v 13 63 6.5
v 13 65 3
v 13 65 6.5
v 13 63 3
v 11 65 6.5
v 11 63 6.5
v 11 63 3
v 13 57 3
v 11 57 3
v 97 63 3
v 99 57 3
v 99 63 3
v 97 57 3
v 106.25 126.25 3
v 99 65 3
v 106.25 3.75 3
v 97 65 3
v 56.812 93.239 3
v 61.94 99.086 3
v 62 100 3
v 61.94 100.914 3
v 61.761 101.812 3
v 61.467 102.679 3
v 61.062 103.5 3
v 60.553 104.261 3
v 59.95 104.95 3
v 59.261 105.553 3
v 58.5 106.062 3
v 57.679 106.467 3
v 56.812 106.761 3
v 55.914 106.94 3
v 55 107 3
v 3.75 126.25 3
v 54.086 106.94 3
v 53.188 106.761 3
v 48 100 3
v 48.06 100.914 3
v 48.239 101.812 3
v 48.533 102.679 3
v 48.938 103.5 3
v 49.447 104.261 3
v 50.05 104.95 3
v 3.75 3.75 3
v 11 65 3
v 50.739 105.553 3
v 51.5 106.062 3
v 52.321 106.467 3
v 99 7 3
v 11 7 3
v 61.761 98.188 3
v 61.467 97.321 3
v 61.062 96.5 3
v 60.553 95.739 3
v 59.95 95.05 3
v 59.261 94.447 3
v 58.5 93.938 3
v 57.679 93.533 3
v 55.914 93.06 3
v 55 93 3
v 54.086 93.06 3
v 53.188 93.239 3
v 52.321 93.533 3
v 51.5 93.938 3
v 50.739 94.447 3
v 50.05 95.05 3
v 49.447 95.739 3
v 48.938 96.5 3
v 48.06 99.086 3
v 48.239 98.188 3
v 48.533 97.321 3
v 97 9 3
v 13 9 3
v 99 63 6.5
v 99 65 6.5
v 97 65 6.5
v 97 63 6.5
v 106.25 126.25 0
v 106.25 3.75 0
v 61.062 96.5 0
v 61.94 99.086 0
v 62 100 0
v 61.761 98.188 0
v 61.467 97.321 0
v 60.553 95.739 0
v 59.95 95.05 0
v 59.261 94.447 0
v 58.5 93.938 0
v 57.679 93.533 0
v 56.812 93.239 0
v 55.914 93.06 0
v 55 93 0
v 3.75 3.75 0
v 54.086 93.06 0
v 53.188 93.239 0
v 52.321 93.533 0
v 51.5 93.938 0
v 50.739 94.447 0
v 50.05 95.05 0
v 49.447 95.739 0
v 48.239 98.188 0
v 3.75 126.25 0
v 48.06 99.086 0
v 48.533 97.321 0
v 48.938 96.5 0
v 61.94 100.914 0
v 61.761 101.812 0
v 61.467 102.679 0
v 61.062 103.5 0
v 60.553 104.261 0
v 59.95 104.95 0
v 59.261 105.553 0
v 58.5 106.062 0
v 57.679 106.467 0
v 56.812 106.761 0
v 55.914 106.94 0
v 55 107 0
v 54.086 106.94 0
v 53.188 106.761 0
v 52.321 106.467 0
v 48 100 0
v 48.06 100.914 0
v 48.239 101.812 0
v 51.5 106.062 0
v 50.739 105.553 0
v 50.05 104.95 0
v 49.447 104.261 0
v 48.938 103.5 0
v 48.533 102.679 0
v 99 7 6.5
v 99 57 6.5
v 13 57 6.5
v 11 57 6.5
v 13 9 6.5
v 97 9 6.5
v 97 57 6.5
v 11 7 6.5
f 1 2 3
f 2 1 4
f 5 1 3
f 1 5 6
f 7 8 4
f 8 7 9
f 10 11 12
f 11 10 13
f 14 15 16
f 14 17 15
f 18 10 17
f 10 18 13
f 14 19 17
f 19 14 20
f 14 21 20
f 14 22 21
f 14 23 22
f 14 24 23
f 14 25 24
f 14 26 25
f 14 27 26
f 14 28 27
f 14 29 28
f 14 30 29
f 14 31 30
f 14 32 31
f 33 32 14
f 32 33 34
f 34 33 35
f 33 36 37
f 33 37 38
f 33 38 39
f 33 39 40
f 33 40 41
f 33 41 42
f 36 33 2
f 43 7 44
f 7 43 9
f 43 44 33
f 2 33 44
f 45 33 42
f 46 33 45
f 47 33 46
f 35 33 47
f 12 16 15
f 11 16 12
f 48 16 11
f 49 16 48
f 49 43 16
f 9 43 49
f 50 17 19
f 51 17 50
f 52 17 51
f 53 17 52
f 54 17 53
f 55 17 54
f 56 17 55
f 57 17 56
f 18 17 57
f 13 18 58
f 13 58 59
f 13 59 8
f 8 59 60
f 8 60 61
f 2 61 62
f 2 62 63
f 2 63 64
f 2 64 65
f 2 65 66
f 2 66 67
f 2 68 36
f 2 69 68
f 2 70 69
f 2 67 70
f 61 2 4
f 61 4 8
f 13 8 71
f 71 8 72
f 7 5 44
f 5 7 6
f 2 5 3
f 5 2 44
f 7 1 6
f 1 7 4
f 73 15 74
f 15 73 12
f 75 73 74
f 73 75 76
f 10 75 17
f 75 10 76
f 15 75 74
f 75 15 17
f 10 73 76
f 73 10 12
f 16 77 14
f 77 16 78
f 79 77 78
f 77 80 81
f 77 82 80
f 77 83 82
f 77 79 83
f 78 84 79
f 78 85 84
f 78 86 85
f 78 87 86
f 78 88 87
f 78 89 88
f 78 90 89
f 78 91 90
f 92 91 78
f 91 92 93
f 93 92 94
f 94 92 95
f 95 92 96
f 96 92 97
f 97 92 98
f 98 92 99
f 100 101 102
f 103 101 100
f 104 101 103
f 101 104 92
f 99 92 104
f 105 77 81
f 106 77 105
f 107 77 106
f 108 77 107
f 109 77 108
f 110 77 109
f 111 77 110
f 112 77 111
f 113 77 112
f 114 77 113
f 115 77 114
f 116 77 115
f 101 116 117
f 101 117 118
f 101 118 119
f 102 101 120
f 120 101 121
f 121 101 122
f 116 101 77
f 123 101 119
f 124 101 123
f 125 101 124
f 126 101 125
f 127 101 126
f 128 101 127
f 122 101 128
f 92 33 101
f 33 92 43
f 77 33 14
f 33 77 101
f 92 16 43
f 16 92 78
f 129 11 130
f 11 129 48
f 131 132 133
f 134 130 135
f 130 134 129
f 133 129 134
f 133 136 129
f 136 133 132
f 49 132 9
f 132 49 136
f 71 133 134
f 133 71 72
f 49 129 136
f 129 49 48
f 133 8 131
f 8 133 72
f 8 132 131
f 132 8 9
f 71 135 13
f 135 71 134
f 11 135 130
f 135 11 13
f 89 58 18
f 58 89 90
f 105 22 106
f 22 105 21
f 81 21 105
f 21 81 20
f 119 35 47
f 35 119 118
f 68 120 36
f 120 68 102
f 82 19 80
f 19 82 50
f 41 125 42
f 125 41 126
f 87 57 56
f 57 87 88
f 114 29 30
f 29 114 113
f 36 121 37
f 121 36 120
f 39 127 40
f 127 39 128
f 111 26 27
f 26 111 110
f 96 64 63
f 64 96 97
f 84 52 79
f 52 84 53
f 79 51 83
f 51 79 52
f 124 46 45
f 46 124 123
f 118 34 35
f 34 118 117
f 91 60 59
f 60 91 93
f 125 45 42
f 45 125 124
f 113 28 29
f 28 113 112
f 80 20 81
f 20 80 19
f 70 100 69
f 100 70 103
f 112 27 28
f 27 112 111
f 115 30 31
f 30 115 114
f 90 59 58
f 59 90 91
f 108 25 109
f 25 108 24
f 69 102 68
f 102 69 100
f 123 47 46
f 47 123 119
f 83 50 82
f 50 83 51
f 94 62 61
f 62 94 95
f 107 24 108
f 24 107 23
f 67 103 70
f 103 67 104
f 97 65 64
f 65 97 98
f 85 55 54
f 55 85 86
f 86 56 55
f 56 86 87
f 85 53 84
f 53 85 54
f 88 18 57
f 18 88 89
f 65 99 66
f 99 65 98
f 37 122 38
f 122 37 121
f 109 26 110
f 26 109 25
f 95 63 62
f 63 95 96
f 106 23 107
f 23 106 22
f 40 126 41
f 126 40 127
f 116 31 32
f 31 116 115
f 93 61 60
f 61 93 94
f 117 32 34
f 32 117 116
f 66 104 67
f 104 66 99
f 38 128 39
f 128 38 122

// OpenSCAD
// ============================================================
// KEA — Mini bartop-arcade desk chassis
// Raspberry Pi 3 + ELEGOO 3.5" TFT (480x320) + 3 buttons +
// KY-040 encoder + toggle + SG90 pan-tilt camera on top.
//
// Render one part at a time (set `part`), export STL, print.
// All dimensions in mm. Tune the CALIBRATE block after
// measuring your actual Pi+display stack.
// ============================================================

part = "bottom"; // "shell" | "shell_left" | "shell_right" | "bottom" | "door"
                // | "wedge" | "camstand" | "camplate" | "assembly"
                // | "riser_base" | "riser_tower" (print 2x) | "riser_tray"
                // RECOMMENDED PRINT: shell_left + shell_right, each lying on
                // its cut face -> every feature prints as a vertical wall,
                // NO supports needed anywhere. Align the halves with short
                // pieces of 1.75 mm filament in the dowel holes and glue.

$fn = 48;

teardrop = true;  // true for the sideways split print: round holes get a
                  // 45-degree point on the side that faces UP in that
                  // orientation (+x), so their crowns print without support.
                  // Set false if you print the shell upright in one piece.

// cylinder that hulls into a 45-degree teardrop point along +/-x.
// dir must point toward "print up": +1 for holes in the right half,
// -1 for holes in the left half (it lies on the bed the other way).
module tear_cyl(d, h, center=false, dir=1) {
  if (teardrop)
    hull() {
      cylinder(d=d, h=h, center=center);
      translate([dir*d*0.71, 0, 0]) cylinder(d=0.6, h=h, center=center);
    }
  else
    cylinder(d=d, h=h, center=center);
}

// ---------- Main body ----------
W        = 110;   // exterior width
D        = 130;   // exterior depth
cut_x    = 21.5;  // split-print plane: near the left side, between the
                  // toggle (ends ~19.2) and the blue button (starts ~23.8),
                  // clear of the screen opening and camera slot
wall     = 3;     // CASE THICKNESS: one knob for every wall, the deck, the
                  // screen panel and the top. Everything derives from it
                  // (ledge, nubs, camstand pegs, socket depths). Keep it
                  // 2.5-4: above ~4 the KY-040's bushing thread gets too
                  // short to catch its nut through the deck.
front_h  = 35;    // front panel height
deck_y   = 48;    // control deck end (depth)
deck_z   = 52;    // control deck end (height)
tilt     = 25;    // screen tilt back from vertical (deg)
slen     = 100;   // screen panel length along slope (portrait display)
marq     = 24;    // marquee height above screen panel

sy = deck_y + slen*sin(tilt);      // top of slope, depth  (~99.6)
sz = deck_z + slen*cos(tilt);      // top of slope, height (~125.7)
H  = sz + marq;                    // total height         (~149.7)
deck_a   = atan2(deck_z-front_h, deck_y);          // deck angle (~19.5 deg)
deck_len = sqrt(deck_y*deck_y + (deck_z-front_h)*(deck_z-front_h)); // ~50.9

// ---------- CALIBRATE: measure your hardware ----------
scr_vis   = [51, 75];    // PORTRAIT screen cutout (active area 48.96 x 73.44 + margin)
disp_pcb  = [56, 85.5];  // display module = full Pi 3B+ footprint, portrait
// (stack thickness no longer matters: the cradle's shelf carries the
//  stack and the WEDGE part self-adjusts to any thickness 20-30 mm)
// Power inlet: slot in the side wall aligned with the Pi's micro-USB jack
// (stock PSU plugs in directly — no adapters). Dry-fit the Pi+display stack
// and measure these before printing:
pwr_side  = -1;          // 1 = right wall (x=W), -1 = left wall (x=0)
pwr_depth = 20;          // panel inner face -> jack axis (measure at dry-fit)
pwr_z     = 82;          // along-slope position of jack center — near the TOP
                         //   of the slope (jack ~10.6 mm from the Pi corner;
                         //   use ~18 instead if the power edge sits low)

// ---------- Small parts ----------
btn_d     = 12.4;        // 12 mm pushbutton hole
enc_d     = 7.5;         // KY-040 shaft bushing hole
tog_d     = 6.4;         // mini toggle hole
cam_holes = [21, 12.5];  // Pi camera v1 hole pattern, 2 mm holes

// ============================================================
// Helper frames
// ============================================================
module screen_frame() {                 // local: x=width, z=up-slope, +y=into cabinet
  translate([0, deck_y, deck_z]) rotate([-tilt, 0, 0]) children();
}
module deck_frame() {                   // local: x=width, y=up-deck, +z=out of deck
  translate([0, 0, front_h]) rotate([deck_a, 0, 0]) children();
}

// ============================================================
// SHELL
// ============================================================
profile = [[0,0],[D,0],[D,H],[sy,H],[sy,sz],[deck_y,deck_z],[0,front_h]];

module shell() {
  difference() {
    union() {
      // walls
      difference() {
        rotate([90,0,90]) linear_extrude(W) polygon(profile);
        translate([wall,0,0]) rotate([90,0,90])
          linear_extrude(W-2*wall) offset(delta=-wall) polygon(profile);
      }
      bottom_ledge();
      bottom_nubs();
      screen_frame() stack_cradle();
    }
    // open bottom (bottom plate snaps in between the nubs and the ledge)
    translate([wall, wall, -1]) cube([W-2*wall, D-2*wall, wall+2]);
    // back door opening — nearly the whole back wall, so the Pi+display
    // stack (85 mm long) goes in without contortions
    translate([10, D-wall-1, 12]) cube([W-20, wall+2, 130]);
    // screen cutout
    screen_frame() translate([W/2, 1.5, slen/2])
      cube([scr_vis[0], wall+6, scr_vis[1]], center=true);
    // control deck holes
    deck_frame() deck_holes();
    // camera stand peg sockets (press-fit, no screws)
    camstand_sockets();
    // camera ribbon slot — positioned relative to the camstand center so
    // it stays aligned with the stand's own pass-through at ANY tilt
    translate([W/2-12.5, (sy+D)/2 - 10.9, H-wall-1]) cube([25, 4.1, wall+2]);
    // marquee label
    translate([W/2, sy+1.2, sz+marq/2]) rotate([90,0,0])
      linear_extrude(1.4) text("K E A", size=11, font="DejaVu Sans:style=Bold",
                               halign="center", valign="center");
    // power inlet slot (side wall)
    power_slot();
    // alignment dowel holes on the center cut plane (2.0 mm: a short
    // piece of 1.75 mm filament is the dowel). Harmless in a one-piece
    // print — they're buried inside the walls.
    dowel_holes();
  }
}

module dowel_holes() {
  for (p = [[1.5, 15],                 // front wall
            [D-1.5, 6],                // back wall, below the door opening
            [D-1.5, 148],              // back wall, above the door opening
            [(sy+D)/2, H-1.5]])        // top plate
    translate([cut_x-6, p[0], p[1]])
      rotate([0, 90, 0]) cylinder(d=2.0, h=12);
}

// Oversized slot so the micro-USB plug body passes through the 3 mm wall;
// elongated along the slope and in depth for alignment tolerance.
module power_slot() {
  screen_frame()
    translate([pwr_side > 0 ? W - 19 : -6, pwr_depth, pwr_z])
      rotate([0, 90, 0])
        hull() for (dz = [-4, 4], dy = [-2.5, 2.5])
          translate([dz, dy, 0]) cylinder(d=13, h=25);   // long enough to
                                                          // notch the rail too
}

module camstand_sockets() {
  py = (sy+D)/2;                            // stand center, depth
  for (s = [-1,1]) translate([W/2 + s*10, py, H-wall-1])
    tear_cyl(d=5.5, h=wall+2);              // sockets for the stand's pegs
}

// The bottom plate is fully screwless: it pushes in from below past six
// friction nubs and stops against a perimeter ledge, sitting recessed
// ~0.8 mm. Nubs print from the bed; the ledge is a tiny 1.8 mm bridge.
module bottom_ledge() {
  lt = 1.5;   // ledge thickness
  lp = 1.8;   // ledge protrusion into the interior
  translate([wall, wall, wall+0.8]) cube([W-2*wall, lp, lt]);
  translate([wall, D-wall-lp, wall+0.8]) cube([W-2*wall, lp, lt]);
  translate([wall, wall, wall+0.8]) cube([lp, D-2*wall, lt]);
  translate([W-wall-lp, wall, wall+0.8]) cube([lp, D-2*wall, lt]);
}
module bottom_nubs() {
  np = 1.15;  // protrusion (squeezes the plate edges for friction)
  for (x = [W*0.3, W*0.7]) {
    translate([x-3, wall, 0]) cube([6, np, 1.4]);
    translate([x-3, D-wall-np, 0]) cube([6, np, 1.4]);
  }
  translate([wall, D/2-3, 0]) cube([np, 6, 1.4]);
  translate([W-wall-np, D/2-3, 0]) cube([np, 6, 1.4]);
}

// ============================================================
// STACK CRADLE — the fix for "the Pi has nowhere to sit".
// The display+Pi stack leans against the screen panel like a
// picture in a frame: its bottom edge RESTS on a solid shelf,
// two side guides center it, and the printed WEDGE part slides
// down the slope behind the Pi until it jams snug against the
// back flanges. Gravity keeps it tight. Works for ANY stack
// thickness from ~20 to ~30 mm — nothing to measure.
// ============================================================
module stack_cradle() {
  // shelf under the stack's bottom edge (rooted in both side walls)
  translate([wall, wall, 2.5]) cube([W - 2*wall, 30, 4]);
  // side guides: vertical ribs just outside the 56 mm stack width
  for (gx = [23.5, 83.5])
    translate([gx, wall, 4]) cube([3, 30, 66]);
  // back flanges: the fixed plane the wedge bears against — kept SHORT
  // (bottom half only) so the channel is wide open for insertion.
  // Gap in the middle keeps the CSI ribbon path clear.
  translate([23.5, wall + 29, 8]) cube([21.5, 3, 44]);
  translate([65, wall + 29, 8]) cube([21.5, 3, 44]);
}

// ============================================================
// WEDGE: drop it thin-end-first between the Pi's back and the
// cradle flanges, nudge it down the slope until snug. Covers a
// 2-9.5 mm gap, so any Pi+display stack clamps tight. Pull it
// up to release the stack. Print lying on its flat face.
// ============================================================
module wedge() {
  difference() {
    union() {
      rotate([90, 0, 90]) linear_extrude(58)
        polygon([[0, 0], [1.5, 0], [9.5, 62], [0, 62]]);
      // grip tab on the thick end
      translate([0, 0, 56]) cube([58, 11, 6]);
    }
    // wire pass-through: GPIO jumpers from the Pi's exposed pins run
    // through here. The cutout sits over the cradle's center gap, so
    // the wedge still bears on both flanges at its solid side rails.
    translate([17, -1, 8]) cube([24, 13, 44]);
  }
}

module deck_holes() {
  // 3 buttons: blue / red / green (GPIO 21 / 20 / 26)
  for (bx = [30, 55, 80])
    translate([bx, 32, 0]) tear_cyl(d=btn_d, h=24, center=true);
  // KY-040 rotary encoder (right), mini toggle (left)
  translate([94, 16, 0]) tear_cyl(d=enc_d, h=24, center=true);
  translate([16, 16, 0]) tear_cyl(d=tog_d, h=24, center=true, dir=-1);  // left half
}

// ============================================================
// BOTTOM PLATE (screwless: pushes in from below past the friction
// nubs until it stops against the ledge; finger hole to pull it out).
// Now with a breadboard corral: a low fence sized for the 400-point
// half breadboard (83 x 55) so it sits captive on the floor — use its
// adhesive back too if you want it permanent. Open on the back side
// for the jumper wires.
// ============================================================
module bottom_plate() {
  bb_w = 84; bb_d = 56;                       // breadboard + play
  bx = (W - bb_w) / 2;
  by = wall + 6;                              // toward the front wall
  difference() {
    union() {
      translate([wall+0.75, wall+0.75, 0])
        cube([W-2*wall-1.5, D-2*wall-1.5, wall]);
      // corral fence, 3.5 mm tall, 2 mm thick — open on the back edge
      translate([bx-2, by-2, wall]) cube([bb_w+4, 2, 3.5]);         // front
      translate([bx-2, by, wall]) cube([2, bb_d-8, 3.5]);           // left
      translate([bx+bb_w, by, wall]) cube([2, bb_d-8, 3.5]);        // right
      for (cx = [bx-2, bx+bb_w])                                    // back corners
        translate([cx, by+bb_d-2, wall]) cube([2, 2, 3.5]);
    }
    translate([W/2, D-30, -1]) cylinder(d=14, h=wall+2);  // finger hole
  }
}

// ============================================================
// BACK DOOR (screwless press-fit: full-size lip with crush ribs
// wedges into the opening; pull tab at the bottom to pop it out)
// ============================================================
module door() {
  difference() {
    union() {
      translate([-51, -71, 0]) cube([102, 142, 2.5]);  // face plate
      translate([-44.7, -64.7, -2.5]) cube([89.4, 129.4, 2.6]);  // press-fit lip
      // crush ribs: 0.5 proud, they squash on first insertion
      for (ry = [-45, 25]) {
        translate([-45.2, ry, -2.5]) cube([0.5, 12, 2.6]);
        translate([44.7, ry, -2.5]) cube([0.5, 12, 2.6]);
      }
      for (rx = [-30, 18]) {
        translate([rx, -65.2, -2.5]) cube([12, 0.5, 2.6]);
        translate([rx, 64.7, -2.5]) cube([12, 0.5, 2.6]);
      }
      translate([-10, 71, 0]) cube([20, 10, 2.5]);     // pull tab (top edge —
                                                       // bottom would hit the desk)
    }
    for (i = [-2:2])                                    // vents
      translate([i*12-1.5, -28, -3]) cube([3, 56, 9]);
    // spare cable hole (e.g. aux 5 V for servos later) — power enters
    // through the side-wall slot instead, no extra parts needed
    translate([0, -54, -3]) cylinder(d=12, h=9);
  }
}

// ============================================================
// CAMERA STAND (no servos, no screws): fork with two chamfered
// pegs that press into the top-plate sockets. The camera plate
// hangs between the arms on an M3 bolt + nyloc nut — a manual
// friction tilt, set the angle once by hand.
// (If you ever add a servo back, only this part changes.)
// ============================================================
module camstand() {
  union() {
    difference() {
      union() {
        translate([-19, -13, 0]) cube([38, 26, 6]);    // base, press-fits to top
        for (s = [-1, 1])                               // fork arms, 28 mm apart
          translate([s*16-2, -6, 0]) cube([4, 12, 32]);
      }
      camstand_cuts();
    }
    // press-fit pegs (chamfered tips) into the top-plate sockets;
    // length follows the wall parameter automatically
    for (s = [-1, 1]) translate([s*10, 0, -(wall+0.4)]) {
      cylinder(d=5.7, h=wall+0.5);
      translate([0, 0, -0.9]) cylinder(d1=4.6, d2=5.7, h=1);
    }
  }
}

module camstand_cuts() {
  // ribbon pass-through: the base sits over the top-plate slot, so the
  // same 25 x 4 slot continues through the base (in front of the arms)
  translate([-12.5, -10.9, -1]) cube([25, 4.1, 8]);
  // M3 tilt axle through both arms
  translate([0, 0, 26]) rotate([0, 90, 0]) cylinder(d=3.2, h=50, center=true);
}

module camera_plate() {
  difference() {
    union() {
      translate([-13.5, -12.5, 0]) cube([27, 25, 2.5]);
      for (s = [-1, 1])                                 // hinge tabs, fit inside fork
        translate([s > 0 ? 10.5 : -13.5, 6.5, 0]) cube([3, 6, 10]);
    }
    for (x = [-1,1], y = [-1,1])                        // Pi camera holes
      translate([x*cam_holes[0]/2, y*cam_holes[1]/2, -1]) cylinder(d=2.2, h=5);
    // notch at the bottom edge: the camera's ribbon connector sits on the
    // BACK of its PCB at the bottom — ribbon folds down through here
    translate([-9, -13.5, -1]) cube([18, 8, 5]);
    // M3 axle through the tabs
    translate([0, 9.5, 6]) rotate([0, 90, 0]) cylinder(d=3.2, h=40, center=true);
  }
}

// ============================================================
// BREADBOARD RISER — freestanding adjustable elevator, so the
// breadboard can sit at whatever height keeps the jumpers short.
// Three flat parts, no supports: base (mortises), two ladder
// towers (tab into the base), and a tray that slides into any
// rung pair — 6 levels, 10 mm apart. Stands anywhere on the
// bottom plate; the tray also carries a fence for the 83x55
// half breadboard. Lift the tray, move it a rung, done.
// ============================================================
module riser_base() {
  difference() {
    union() {
      cube([100, 50, 3]);
      for (fx = [2, 92], fy = [2, 42])          // feet: clear the tab tips
        translate([fx, fy, -1.5]) cube([6, 6, 1.5]);
    }
    for (x = [3, 93.6]) translate([x, 5, -1]) cube([3.4, 40, 5]);  // mortises
    translate([22, 8, -1]) cube([56, 34, 5]);   // lightening hole
  }
}

module riser_tower() {
  // printed flat: x = depth (50), y = height (75)
  difference() {
    cube([50, 75, 3]);
    for (h = [16, 26, 36, 46, 56, 66])          // ladder slots for the tray
      translate([5, h, -1]) cube([40, 3.6, 5]);
    translate([12, 4, -1]) cube([26, 8, 5]);    // wire pass at floor level
  }
  translate([5.3, -4, 0]) cube([39.4, 4, 3]);   // tab into the base mortise
}

module riser_tray() {
  union() {
    difference() {
      cube([87, 50, 3]);
      translate([30, 12, -1]) cube([27, 26, 5]);  // lightening + zip-tie hole
    }
    for (tx = [-6, 87])                            // side tabs -> tower slots
      translate([tx, 6, 0]) cube([6, 38, 3]);
    // breadboard fence (pocket 83.6 wide, open front/back for wires)
    translate([1.4, 0, 3]) cube([2, 50, 3.5]);
    translate([85.0 - 1.4, 0, 3]) cube([2, 50, 3.5]);
  }
}

// ============================================================
// RENDER
// ============================================================
if (part == "shell")    shell();
if (part == "shell_left")                       // print lying on the cut face
  intersection() { shell(); translate([-1, -1, -1]) cube([cut_x+1, D+2, H+2]); }
if (part == "shell_right")
  intersection() { shell(); translate([cut_x, -1, -1]) cube([W-cut_x+1, D+2, H+2]); }
if (part == "bottom")   bottom_plate();
if (part == "door")     door();
if (part == "wedge")    wedge();
if (part == "riser_base")  riser_base();
if (part == "riser_tower") riser_tower();
if (part == "riser_tray")  riser_tray();
if (part == "camstand") camstand();
if (part == "camplate") camera_plate();
if (part == "assembly") {
  color("SteelBlue", 0.85) shell();
  color("gray") bottom_plate();
  color("dimgray") translate([W/2, D+0.5, 77]) rotate([-90,0,0]) door();
  color("orange") translate([W/2, (sy+D)/2, H]) camstand();
  color("tomato") screen_frame() translate([26, wall+19.5, 6]) wedge();
  color("orange") translate([W/2, (sy+D)/2-9.5, H+20]) rotate([90,0,0]) camera_plate();
}
